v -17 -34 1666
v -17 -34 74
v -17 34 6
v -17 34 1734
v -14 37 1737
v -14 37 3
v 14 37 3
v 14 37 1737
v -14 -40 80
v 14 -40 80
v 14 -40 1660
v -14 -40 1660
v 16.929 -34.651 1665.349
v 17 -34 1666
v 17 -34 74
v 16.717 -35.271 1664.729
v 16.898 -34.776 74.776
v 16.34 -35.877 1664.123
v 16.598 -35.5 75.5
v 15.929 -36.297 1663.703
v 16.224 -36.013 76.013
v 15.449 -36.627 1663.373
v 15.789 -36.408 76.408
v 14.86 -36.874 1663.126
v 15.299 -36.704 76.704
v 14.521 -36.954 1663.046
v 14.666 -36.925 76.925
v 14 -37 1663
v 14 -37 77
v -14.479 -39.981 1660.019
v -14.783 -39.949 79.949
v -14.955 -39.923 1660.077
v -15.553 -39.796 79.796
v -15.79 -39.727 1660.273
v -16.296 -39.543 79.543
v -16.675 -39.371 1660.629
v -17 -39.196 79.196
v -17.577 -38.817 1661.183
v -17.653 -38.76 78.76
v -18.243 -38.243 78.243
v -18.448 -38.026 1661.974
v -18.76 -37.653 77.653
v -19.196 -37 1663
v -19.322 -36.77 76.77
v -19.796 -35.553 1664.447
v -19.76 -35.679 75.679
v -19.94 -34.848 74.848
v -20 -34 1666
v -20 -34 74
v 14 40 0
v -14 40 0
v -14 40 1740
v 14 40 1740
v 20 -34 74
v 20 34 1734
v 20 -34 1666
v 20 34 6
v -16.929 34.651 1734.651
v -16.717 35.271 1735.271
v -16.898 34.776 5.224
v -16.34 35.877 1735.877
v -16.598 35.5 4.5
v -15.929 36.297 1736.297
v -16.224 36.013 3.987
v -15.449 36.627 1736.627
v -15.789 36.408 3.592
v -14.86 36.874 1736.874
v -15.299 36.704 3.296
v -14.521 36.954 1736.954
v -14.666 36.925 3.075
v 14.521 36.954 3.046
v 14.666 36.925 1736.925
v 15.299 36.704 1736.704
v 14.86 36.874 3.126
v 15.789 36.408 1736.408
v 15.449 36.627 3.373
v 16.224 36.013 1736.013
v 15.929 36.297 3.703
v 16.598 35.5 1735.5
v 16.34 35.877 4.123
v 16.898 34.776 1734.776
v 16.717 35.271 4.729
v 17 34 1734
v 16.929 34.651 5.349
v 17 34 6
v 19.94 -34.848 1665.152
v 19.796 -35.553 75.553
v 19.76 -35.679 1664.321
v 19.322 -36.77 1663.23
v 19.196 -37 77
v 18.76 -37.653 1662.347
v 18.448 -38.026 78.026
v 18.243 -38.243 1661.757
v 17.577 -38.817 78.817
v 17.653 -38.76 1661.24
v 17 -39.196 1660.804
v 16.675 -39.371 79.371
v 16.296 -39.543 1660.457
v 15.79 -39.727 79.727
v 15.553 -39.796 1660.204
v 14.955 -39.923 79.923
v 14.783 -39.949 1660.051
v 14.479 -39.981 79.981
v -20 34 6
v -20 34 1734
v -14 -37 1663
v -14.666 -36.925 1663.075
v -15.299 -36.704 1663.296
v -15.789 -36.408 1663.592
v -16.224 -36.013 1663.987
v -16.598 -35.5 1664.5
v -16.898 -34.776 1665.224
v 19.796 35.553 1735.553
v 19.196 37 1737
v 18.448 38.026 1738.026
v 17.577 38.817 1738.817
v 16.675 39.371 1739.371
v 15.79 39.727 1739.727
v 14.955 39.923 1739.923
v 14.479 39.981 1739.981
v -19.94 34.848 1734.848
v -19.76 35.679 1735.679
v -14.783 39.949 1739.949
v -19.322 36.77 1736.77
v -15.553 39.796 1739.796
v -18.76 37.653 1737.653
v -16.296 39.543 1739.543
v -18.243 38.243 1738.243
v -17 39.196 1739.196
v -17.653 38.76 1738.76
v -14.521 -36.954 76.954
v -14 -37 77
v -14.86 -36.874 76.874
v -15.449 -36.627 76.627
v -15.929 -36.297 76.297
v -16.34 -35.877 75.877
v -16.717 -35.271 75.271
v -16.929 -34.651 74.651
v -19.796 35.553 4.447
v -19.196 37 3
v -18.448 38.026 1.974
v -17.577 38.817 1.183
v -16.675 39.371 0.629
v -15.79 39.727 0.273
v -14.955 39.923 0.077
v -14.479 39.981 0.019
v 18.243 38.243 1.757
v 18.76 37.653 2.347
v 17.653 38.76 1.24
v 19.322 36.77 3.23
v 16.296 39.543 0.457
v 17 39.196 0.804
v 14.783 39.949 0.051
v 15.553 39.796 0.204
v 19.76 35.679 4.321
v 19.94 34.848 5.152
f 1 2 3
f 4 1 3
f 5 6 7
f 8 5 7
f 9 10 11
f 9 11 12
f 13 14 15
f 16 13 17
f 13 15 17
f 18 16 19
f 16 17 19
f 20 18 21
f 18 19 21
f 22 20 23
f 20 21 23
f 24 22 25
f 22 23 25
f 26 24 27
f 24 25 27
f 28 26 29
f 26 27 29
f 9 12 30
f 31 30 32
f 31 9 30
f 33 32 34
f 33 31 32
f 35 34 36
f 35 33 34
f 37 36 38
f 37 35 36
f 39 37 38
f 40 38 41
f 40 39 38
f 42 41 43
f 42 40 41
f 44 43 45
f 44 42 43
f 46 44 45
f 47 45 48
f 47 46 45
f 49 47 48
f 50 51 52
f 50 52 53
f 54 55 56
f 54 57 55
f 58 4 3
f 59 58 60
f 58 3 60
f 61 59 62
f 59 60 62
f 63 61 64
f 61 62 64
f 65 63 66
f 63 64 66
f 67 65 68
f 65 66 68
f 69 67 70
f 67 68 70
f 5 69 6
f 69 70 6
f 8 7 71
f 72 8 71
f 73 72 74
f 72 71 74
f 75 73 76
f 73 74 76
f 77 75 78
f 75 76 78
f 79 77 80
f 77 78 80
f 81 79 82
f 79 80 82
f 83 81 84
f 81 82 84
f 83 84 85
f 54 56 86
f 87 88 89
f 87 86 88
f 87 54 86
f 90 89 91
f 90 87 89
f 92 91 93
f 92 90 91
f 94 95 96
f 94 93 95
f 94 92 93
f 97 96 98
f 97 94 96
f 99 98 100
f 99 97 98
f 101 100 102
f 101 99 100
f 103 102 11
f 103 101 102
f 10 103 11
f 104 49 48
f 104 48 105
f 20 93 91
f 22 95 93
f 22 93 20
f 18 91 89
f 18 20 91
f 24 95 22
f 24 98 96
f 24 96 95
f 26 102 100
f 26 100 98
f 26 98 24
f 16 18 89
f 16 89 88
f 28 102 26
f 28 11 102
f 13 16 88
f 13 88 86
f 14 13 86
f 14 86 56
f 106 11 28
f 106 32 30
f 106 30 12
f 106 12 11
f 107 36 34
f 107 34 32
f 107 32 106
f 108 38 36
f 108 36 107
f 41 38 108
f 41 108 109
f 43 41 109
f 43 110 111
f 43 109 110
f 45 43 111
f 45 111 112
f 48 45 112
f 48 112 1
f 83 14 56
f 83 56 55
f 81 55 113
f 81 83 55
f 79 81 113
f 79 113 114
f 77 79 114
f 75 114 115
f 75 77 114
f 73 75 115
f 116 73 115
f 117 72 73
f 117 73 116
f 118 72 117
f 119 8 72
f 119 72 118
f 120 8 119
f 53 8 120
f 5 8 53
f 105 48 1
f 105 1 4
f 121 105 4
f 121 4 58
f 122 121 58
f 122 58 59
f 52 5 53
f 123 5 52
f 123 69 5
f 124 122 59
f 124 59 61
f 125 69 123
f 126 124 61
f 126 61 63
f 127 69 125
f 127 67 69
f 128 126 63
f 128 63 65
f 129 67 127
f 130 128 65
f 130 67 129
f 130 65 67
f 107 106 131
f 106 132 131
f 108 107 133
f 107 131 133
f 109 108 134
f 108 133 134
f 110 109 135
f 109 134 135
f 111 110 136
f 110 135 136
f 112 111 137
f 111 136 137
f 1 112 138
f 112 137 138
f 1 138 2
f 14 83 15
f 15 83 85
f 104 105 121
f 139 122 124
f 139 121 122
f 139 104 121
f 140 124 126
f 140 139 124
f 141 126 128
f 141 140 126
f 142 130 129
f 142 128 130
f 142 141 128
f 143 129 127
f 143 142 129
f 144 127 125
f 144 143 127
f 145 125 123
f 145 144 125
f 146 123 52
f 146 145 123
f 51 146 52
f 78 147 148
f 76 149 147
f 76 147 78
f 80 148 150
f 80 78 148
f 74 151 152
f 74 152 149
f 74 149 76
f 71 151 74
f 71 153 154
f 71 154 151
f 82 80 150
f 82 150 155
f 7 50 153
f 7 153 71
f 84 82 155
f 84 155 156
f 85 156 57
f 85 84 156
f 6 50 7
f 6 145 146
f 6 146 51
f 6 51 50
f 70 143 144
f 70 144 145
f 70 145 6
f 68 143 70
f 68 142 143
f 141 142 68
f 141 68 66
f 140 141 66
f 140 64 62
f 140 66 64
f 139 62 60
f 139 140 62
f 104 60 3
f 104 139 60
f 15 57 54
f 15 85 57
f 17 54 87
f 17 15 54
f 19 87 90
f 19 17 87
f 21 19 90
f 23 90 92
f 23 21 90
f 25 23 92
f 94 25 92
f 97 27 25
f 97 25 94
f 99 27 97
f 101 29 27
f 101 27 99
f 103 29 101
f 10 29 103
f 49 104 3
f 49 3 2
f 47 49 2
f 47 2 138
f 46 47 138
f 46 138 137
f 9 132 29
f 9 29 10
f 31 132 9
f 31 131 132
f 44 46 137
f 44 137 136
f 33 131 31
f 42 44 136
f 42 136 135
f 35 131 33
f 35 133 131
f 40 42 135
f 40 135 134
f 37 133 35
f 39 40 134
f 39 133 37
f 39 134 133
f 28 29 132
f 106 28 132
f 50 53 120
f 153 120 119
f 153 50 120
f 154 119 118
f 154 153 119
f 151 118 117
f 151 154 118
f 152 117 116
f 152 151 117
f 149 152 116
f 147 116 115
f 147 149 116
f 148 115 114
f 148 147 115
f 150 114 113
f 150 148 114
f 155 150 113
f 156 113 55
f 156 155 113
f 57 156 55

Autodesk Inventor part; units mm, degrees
ref_plane "Start Plane" through (0, 0, 0) normal (0, 0, 1) x (1, 0, 0)
ref_plane "End Plane" through (0, 0, 1740) normal (0, 0, 1) x (1, 0, 0)
sketch "Sketch" plane through (0, 0, 0) normal (0, 0, 1) x (1, 0, 0)
  line L0 (-20, -34) -> (-20, 34)
  line L1 (-14, 40) -> (14, 40)
  line L2 (20, 34) -> (20, -34)
  line L3 (14, -40) -> (-14, -40)
  arc A0 (-20, -34) -> (-14, -40) centre (-14, -34) ccw
  arc A1 (20, 34) -> (14, 40) centre (14, 34) ccw
  arc A2 (-14, 40) -> (-20, 34) centre (-14, 34) ccw
  arc A3 (14, -40) -> (20, -34) centre (14, -34) ccw
  arc A4 (-14, 37) -> (-17, 34) centre (-14, 34) ccw
  line L4 (-14, 37) -> (14, 37)
  arc A5 (17, 34) -> (14, 37) centre (14, 34) ccw
  line L5 (17, 34) -> (17, -34)
  arc A6 (14, -37) -> (17, -34) centre (14, -34) ccw
  line L6 (14, -37) -> (-14, -37)
  arc A7 (-17, -34) -> (-14, -37) centre (-14, -34) ccw
  line L7 (-17, -34) -> (-17, 34)
  line L8 (0, 57.7397) -> (0, -57.7397) construction
  line L9 (-29.7397, 0) -> (29.7397, 0) construction
  dimension "d7" = 6
  dimension "d9" = 40
  dimension "d11" = 80
  dimension "d12" = 3
  dimension "d15" = 20
  dimension "d16" = 40
extrude "Body" add sketch "Sketch" along normal up to surface (1740 mm away) from surface at 0
sketch "Sketch3" plane through (0, 0, 0) normal (0, 0, 1) x (1, 0, 0)
  line L0 (0, 0) -> (10, 0)
ref_plane "Work Plane3" through (0, 0, 0) normal (0, -1, 0) x (1, 0, 0)
ref_plane "Work Plane4" through (0, 40, 0) normal (0, -0.7071, -0.7071) x (1, 0, 0)
split "Split1" plane through (0, 40, 0) removes the side toward (0, -0.7071, -0.7071)
ref_plane "Work Plane5" through (0, 40, 1740) normal (0, -0.7071, 0.7071) x (1, 0, 0)
split "Split2" plane through (0, 40, 1740) removes the side toward (0, -0.7071, 0.7071)
sketch "Sketch4" plane through (0, 0, 0) normal (0, -1, 0) x (1, 0, 0)
  line L0 (-2, 0) -> (12, 0) projected
  line L1 (-2, 1740) -> (12, 1740) projected
  dimension "d18" = 1740
equation "\"d7\" = G_IR"
equation "\"d9\" = G_W"
equation "\"d11\" = G_H"
equation "\"d12\" = G_T"
equation "\"d15\" = 0.5 * d9"
equation "\"d16\" = 0.5 * d11"
equation "\"d3\" = G_L"
equation "\"G_W\" = 40"
equation "\"G_H\" = 80"
equation "\"G_T\" = 3"
equation "\"G_IR\" = 6"
equation "\"G_L\" = d18"
equation "\"G_OFFSET_START\" = 0"
equation "\"G_OFFSET_END\" = 0"
properties part number "ISO 10799-2 - 80x40x3 - 1740" material "Stainless Steel"
